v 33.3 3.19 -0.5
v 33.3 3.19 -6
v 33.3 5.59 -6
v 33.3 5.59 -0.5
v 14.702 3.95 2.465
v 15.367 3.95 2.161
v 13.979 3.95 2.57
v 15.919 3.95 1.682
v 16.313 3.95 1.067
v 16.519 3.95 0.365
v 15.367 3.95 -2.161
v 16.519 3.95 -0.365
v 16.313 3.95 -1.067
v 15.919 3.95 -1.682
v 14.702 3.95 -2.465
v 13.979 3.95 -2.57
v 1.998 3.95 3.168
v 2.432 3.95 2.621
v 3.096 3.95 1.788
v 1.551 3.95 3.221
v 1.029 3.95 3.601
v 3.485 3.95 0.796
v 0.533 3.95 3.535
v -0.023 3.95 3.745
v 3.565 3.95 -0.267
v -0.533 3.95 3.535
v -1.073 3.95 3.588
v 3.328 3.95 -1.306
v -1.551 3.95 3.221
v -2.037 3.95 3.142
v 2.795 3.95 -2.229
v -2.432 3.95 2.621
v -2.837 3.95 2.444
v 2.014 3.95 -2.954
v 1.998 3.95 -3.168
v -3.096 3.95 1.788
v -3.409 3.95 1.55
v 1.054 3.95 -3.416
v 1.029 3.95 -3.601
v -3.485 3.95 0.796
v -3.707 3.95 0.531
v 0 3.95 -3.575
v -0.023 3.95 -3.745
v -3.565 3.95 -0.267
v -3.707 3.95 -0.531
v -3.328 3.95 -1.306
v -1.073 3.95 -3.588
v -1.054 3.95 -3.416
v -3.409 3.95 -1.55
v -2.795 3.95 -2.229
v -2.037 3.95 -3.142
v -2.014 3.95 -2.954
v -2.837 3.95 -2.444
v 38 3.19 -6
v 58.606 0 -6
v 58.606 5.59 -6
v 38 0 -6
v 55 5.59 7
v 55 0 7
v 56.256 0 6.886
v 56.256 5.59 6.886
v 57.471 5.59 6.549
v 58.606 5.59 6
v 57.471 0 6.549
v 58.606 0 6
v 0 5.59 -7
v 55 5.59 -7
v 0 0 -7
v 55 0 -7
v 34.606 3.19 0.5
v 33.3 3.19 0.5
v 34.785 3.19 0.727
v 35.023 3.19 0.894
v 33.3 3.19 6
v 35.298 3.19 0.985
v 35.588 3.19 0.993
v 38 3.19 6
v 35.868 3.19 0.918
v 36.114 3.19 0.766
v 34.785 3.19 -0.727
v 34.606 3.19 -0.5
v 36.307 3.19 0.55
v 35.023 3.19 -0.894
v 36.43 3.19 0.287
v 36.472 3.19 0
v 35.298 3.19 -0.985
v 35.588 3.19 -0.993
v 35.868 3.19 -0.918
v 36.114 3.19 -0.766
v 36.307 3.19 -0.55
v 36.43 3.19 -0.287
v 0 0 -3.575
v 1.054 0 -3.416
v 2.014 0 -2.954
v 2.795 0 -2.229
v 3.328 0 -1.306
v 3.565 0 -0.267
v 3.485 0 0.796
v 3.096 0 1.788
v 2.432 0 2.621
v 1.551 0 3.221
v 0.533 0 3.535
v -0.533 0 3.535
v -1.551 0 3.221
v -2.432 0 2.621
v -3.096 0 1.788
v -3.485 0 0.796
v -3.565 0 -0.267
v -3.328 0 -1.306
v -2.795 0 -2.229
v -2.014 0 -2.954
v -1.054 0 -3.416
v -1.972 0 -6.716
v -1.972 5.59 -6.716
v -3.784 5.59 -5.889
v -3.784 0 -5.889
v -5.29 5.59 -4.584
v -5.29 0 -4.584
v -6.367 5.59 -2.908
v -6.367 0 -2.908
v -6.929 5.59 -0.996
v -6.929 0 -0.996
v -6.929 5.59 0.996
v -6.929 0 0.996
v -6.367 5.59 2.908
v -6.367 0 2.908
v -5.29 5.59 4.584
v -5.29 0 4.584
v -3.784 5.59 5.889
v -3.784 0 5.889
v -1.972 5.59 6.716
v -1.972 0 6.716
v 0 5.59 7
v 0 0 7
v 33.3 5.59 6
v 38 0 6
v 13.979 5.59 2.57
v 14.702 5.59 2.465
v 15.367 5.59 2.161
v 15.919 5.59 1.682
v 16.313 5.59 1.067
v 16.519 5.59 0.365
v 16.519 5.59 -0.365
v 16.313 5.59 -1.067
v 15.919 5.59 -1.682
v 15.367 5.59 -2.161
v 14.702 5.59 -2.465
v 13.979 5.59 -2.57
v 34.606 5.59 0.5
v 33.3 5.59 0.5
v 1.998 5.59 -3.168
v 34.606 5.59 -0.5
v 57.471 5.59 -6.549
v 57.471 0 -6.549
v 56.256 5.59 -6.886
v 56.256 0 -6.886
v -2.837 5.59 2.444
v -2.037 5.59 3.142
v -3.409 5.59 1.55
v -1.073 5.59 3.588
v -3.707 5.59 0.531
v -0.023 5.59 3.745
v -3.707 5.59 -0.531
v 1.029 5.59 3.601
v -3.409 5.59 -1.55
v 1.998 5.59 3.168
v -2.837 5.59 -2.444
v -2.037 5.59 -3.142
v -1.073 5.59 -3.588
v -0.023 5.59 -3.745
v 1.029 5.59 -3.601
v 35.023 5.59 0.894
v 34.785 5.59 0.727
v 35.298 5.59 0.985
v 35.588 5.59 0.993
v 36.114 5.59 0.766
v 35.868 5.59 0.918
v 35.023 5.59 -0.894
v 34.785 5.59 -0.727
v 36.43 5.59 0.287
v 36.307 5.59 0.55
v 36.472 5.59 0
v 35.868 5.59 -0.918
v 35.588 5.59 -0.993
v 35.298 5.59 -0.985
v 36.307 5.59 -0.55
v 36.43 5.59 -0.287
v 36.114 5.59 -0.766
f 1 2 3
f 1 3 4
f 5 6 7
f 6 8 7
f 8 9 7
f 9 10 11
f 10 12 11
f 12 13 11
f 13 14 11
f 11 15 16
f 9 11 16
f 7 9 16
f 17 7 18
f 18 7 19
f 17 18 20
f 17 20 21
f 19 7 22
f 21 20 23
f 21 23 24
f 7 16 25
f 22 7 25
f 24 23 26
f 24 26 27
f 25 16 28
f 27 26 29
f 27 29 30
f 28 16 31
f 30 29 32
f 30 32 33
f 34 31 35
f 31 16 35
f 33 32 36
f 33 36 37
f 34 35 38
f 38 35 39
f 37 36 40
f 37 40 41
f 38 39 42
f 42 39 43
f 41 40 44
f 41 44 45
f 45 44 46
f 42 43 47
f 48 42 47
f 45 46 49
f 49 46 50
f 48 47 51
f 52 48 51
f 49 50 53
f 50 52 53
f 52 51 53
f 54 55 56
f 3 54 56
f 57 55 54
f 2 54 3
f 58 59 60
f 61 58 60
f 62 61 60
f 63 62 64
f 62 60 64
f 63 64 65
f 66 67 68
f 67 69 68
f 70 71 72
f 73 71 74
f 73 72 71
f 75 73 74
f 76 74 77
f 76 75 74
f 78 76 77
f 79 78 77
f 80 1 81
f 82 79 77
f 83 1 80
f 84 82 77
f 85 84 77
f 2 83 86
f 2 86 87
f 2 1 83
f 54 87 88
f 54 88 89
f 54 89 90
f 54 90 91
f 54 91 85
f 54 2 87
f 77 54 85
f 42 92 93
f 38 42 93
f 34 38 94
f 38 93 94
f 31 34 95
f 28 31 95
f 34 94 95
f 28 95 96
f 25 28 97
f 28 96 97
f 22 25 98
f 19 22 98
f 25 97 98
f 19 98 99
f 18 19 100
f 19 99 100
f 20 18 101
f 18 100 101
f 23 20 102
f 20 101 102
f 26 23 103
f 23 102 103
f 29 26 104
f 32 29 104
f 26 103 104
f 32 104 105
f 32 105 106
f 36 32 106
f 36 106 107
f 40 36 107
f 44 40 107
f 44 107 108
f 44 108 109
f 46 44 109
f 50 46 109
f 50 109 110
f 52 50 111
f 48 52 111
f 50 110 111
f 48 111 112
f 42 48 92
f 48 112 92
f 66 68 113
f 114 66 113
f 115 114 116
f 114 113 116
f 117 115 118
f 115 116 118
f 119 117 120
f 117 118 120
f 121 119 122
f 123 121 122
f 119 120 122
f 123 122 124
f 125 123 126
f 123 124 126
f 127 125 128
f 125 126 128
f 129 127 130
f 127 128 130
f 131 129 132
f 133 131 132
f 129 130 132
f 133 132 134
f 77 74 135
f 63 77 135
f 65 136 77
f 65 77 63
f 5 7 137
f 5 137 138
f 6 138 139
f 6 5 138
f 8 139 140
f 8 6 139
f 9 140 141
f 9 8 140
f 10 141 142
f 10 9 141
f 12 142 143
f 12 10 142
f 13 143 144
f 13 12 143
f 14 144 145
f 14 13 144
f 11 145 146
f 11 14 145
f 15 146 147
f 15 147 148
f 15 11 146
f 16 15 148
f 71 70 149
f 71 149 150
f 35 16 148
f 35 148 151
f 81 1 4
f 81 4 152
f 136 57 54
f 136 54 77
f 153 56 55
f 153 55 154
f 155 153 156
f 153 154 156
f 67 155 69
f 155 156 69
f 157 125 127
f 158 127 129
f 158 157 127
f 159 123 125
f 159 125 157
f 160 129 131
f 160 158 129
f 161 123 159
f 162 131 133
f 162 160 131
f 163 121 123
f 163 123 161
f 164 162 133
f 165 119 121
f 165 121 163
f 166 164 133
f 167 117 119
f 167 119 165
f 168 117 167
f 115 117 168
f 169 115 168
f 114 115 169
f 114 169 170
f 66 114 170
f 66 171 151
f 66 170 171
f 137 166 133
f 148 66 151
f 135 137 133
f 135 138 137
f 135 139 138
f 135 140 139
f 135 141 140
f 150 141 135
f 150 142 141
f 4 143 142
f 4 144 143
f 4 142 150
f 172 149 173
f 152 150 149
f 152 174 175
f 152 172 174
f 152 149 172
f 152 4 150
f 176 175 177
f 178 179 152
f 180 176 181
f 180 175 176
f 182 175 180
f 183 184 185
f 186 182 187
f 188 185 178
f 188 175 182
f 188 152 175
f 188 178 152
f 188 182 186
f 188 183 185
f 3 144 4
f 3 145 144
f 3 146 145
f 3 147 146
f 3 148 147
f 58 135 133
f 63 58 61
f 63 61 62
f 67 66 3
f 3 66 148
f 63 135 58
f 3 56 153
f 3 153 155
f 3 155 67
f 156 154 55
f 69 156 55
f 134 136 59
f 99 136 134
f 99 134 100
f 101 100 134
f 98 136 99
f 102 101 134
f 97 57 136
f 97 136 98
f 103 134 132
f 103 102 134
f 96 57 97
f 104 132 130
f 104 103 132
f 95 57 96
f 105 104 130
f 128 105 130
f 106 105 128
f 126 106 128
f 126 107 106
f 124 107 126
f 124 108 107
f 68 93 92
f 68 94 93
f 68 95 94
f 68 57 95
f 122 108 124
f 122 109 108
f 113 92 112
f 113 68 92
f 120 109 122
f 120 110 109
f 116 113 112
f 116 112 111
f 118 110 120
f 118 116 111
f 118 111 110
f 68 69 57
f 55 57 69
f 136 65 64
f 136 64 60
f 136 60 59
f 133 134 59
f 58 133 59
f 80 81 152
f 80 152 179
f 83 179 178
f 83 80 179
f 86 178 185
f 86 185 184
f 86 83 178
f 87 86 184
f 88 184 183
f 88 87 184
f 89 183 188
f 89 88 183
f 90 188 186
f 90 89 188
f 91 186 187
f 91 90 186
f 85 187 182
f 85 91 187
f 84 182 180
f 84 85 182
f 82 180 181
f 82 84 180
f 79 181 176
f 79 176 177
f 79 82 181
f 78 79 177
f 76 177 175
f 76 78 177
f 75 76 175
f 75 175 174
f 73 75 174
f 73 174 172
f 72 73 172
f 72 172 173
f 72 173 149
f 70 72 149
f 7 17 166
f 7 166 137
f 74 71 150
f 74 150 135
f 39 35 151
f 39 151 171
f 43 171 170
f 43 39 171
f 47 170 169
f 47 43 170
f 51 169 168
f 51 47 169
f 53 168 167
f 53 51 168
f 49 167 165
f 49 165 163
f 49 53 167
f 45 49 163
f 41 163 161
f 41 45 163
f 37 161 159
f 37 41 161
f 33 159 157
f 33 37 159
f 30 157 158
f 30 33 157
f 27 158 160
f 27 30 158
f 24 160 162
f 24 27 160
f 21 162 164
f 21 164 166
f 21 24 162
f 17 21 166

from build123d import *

# Parameters (mm, degrees)
BOSS_EXTRUDE1_DEPTH = 3.95
SKETCH2_R           = 3.575
CUT_EXTRUDE1_DEPTH  = 3.95
BOSS_EXTRUDE2_DEPTH = 1.64
SKETCH4_R           = 3.25
CUT_EXTRUDE2_DEPTH  = 63.643819328
CAVITY1_OUTLINE_R   = 3.25
CAVITY1_DEPTH       = 5.59
CAVITY1_START       = 3.19
CAVITY1_2_DEPTH     = 2.4
CUT_EXTRUDE4_DEPTH  = 63.643819328


# Read off the part's stored shape, not the designer's step: Cavity1
with BuildPart() as part:
    # Sketch1 → Boss-Extrude1 (new body)
    with BuildSketch(Plane(origin=(0, 0, 0), x_dir=(1, 0, 0), z_dir=(0, 1, 0))):
        with BuildLine():
            Line((0, 7), (55, 7))
            ThreePointArc((55, 7), (62, 0), (55, -7))
            Line((55, -7), (0, -7))
            ThreePointArc((0, -7), (-7, 0), (0, 7))
        make_face()
    extrude(amount=BOSS_EXTRUDE1_DEPTH)

    # Sketch2 → Cut-Extrude1 (cut)
    with BuildSketch(Plane.XZ):
        with Locations(Location((0, 0, 0), (0, 0, 270))):
            Circle(SKETCH2_R)
    extrude(amount=-CUT_EXTRUDE1_DEPTH, mode=Mode.SUBTRACT)

    # Sketch3 → Boss-Extrude2 (add)
    with BuildSketch(Plane(origin=(0, 3.95, 0), x_dir=(1, 0, 0), z_dir=(0, 1, 0))):
        with BuildLine():
            Line((0, -7), (55, -7))
            ThreePointArc((55, -7), (62, 0), (55, 7))
            Line((55, 7), (0, 7))
            ThreePointArc((0, 7), (-7, 0), (0, -7))
        make_face()
        with BuildLine():
            Line((13.979308982, 2.569996388), (1.997926282, 3.167540934))
            ThreePointArc((1.997926282, 3.167540934), (-3.745, 0), (1.997926282, -3.167540934))
            Line((1.997926282, -3.167540934), (13.979308982, -2.569996388))
            ThreePointArc((13.979308982, -2.569996388), (16.545, 0), (13.979308982, 2.569996388))
        make_face(mode=Mode.SUBTRACT)
    extrude(amount=BOSS_EXTRUDE2_DEPTH)

    # Sketch4 → Cut-Extrude2 (cut, through all)
    with BuildSketch(Plane(origin=(0, 5.59, 0), x_dir=(1, 0, 0), z_dir=(0, 1, 0))):
        with Locations(Location((55, 0, 0), (0, 0, 270))):
            Circle(SKETCH4_R)
    extrude(amount=-CUT_EXTRUDE2_DEPTH, mode=Mode.SUBTRACT)

    # Cavity1 outline → Cavity1 (cut)
    with BuildSketch(Plane(origin=(0, 0, 0), x_dir=(1, 0, 0), z_dir=(0, 1, 0))):
        with BuildLine():
            Line((58.605551275, 6), (38, 6))
            Line((38, 6), (38, -6))
            Line((38, -6), (58.605551275, -6))
            ThreePointArc((58.605551275, -6), (59.949747468, -4.949747468), (61, -3.605551275))
            Line((61, -3.605551275), (61, 3.605551275))
            ThreePointArc((61, 3.605551275), (59.949747468, 4.949747468), (58.605551275, 6))
        make_face()
        with Locations((55, 0)):
            Circle(CAVITY1_OUTLINE_R, mode=Mode.SUBTRACT)
    extrude(amount=CAVITY1_DEPTH, mode=Mode.SUBTRACT)

    # Cavity1 2 outline → Cavity1 2 (cut)
    with BuildSketch(Plane(origin=(0, 0, 0), x_dir=(1, 0, 0), z_dir=(0, 1, 0)).offset(CAVITY1_START)):
        with BuildLine():
            Line((33.3, 0.5), (34.605619966, 0.5))
            ThreePointArc((34.605619966, 0.5), (36.47164537, 0), (34.605619966, -0.5))
            Line((34.605619966, -0.5), (33.3, -0.5))
            Line((33.3, -0.5), (33.3, -6))
            Line((33.3, -6), (38, -6))
            Line((38, -6), (38, 6))
            Line((38, 6), (33.3, 6))
            Line((33.3, 6), (33.3, 0.5))
        make_face()
        with BuildLine():
            ThreePointArc((61, -3.605551275), (62, 0), (61, 3.605551275))
            Line((61, 3.605551275), (61, -3.605551275))
        make_face()
    extrude(amount=CAVITY1_2_DEPTH, mode=Mode.SUBTRACT)

    # Sketch5 → Cut-Extrude4 (cut, through all)
    with BuildSketch(Plane.XZ):
        with BuildLine():
            Line((61, 3.605551275), (61, -3.605551275))
            ThreePointArc((61, -3.605551275), (62, 0), (61, 3.605551275))
        make_face()
    extrude(amount=-CUT_EXTRUDE4_DEPTH, mode=Mode.SUBTRACT)


solid = part.part
